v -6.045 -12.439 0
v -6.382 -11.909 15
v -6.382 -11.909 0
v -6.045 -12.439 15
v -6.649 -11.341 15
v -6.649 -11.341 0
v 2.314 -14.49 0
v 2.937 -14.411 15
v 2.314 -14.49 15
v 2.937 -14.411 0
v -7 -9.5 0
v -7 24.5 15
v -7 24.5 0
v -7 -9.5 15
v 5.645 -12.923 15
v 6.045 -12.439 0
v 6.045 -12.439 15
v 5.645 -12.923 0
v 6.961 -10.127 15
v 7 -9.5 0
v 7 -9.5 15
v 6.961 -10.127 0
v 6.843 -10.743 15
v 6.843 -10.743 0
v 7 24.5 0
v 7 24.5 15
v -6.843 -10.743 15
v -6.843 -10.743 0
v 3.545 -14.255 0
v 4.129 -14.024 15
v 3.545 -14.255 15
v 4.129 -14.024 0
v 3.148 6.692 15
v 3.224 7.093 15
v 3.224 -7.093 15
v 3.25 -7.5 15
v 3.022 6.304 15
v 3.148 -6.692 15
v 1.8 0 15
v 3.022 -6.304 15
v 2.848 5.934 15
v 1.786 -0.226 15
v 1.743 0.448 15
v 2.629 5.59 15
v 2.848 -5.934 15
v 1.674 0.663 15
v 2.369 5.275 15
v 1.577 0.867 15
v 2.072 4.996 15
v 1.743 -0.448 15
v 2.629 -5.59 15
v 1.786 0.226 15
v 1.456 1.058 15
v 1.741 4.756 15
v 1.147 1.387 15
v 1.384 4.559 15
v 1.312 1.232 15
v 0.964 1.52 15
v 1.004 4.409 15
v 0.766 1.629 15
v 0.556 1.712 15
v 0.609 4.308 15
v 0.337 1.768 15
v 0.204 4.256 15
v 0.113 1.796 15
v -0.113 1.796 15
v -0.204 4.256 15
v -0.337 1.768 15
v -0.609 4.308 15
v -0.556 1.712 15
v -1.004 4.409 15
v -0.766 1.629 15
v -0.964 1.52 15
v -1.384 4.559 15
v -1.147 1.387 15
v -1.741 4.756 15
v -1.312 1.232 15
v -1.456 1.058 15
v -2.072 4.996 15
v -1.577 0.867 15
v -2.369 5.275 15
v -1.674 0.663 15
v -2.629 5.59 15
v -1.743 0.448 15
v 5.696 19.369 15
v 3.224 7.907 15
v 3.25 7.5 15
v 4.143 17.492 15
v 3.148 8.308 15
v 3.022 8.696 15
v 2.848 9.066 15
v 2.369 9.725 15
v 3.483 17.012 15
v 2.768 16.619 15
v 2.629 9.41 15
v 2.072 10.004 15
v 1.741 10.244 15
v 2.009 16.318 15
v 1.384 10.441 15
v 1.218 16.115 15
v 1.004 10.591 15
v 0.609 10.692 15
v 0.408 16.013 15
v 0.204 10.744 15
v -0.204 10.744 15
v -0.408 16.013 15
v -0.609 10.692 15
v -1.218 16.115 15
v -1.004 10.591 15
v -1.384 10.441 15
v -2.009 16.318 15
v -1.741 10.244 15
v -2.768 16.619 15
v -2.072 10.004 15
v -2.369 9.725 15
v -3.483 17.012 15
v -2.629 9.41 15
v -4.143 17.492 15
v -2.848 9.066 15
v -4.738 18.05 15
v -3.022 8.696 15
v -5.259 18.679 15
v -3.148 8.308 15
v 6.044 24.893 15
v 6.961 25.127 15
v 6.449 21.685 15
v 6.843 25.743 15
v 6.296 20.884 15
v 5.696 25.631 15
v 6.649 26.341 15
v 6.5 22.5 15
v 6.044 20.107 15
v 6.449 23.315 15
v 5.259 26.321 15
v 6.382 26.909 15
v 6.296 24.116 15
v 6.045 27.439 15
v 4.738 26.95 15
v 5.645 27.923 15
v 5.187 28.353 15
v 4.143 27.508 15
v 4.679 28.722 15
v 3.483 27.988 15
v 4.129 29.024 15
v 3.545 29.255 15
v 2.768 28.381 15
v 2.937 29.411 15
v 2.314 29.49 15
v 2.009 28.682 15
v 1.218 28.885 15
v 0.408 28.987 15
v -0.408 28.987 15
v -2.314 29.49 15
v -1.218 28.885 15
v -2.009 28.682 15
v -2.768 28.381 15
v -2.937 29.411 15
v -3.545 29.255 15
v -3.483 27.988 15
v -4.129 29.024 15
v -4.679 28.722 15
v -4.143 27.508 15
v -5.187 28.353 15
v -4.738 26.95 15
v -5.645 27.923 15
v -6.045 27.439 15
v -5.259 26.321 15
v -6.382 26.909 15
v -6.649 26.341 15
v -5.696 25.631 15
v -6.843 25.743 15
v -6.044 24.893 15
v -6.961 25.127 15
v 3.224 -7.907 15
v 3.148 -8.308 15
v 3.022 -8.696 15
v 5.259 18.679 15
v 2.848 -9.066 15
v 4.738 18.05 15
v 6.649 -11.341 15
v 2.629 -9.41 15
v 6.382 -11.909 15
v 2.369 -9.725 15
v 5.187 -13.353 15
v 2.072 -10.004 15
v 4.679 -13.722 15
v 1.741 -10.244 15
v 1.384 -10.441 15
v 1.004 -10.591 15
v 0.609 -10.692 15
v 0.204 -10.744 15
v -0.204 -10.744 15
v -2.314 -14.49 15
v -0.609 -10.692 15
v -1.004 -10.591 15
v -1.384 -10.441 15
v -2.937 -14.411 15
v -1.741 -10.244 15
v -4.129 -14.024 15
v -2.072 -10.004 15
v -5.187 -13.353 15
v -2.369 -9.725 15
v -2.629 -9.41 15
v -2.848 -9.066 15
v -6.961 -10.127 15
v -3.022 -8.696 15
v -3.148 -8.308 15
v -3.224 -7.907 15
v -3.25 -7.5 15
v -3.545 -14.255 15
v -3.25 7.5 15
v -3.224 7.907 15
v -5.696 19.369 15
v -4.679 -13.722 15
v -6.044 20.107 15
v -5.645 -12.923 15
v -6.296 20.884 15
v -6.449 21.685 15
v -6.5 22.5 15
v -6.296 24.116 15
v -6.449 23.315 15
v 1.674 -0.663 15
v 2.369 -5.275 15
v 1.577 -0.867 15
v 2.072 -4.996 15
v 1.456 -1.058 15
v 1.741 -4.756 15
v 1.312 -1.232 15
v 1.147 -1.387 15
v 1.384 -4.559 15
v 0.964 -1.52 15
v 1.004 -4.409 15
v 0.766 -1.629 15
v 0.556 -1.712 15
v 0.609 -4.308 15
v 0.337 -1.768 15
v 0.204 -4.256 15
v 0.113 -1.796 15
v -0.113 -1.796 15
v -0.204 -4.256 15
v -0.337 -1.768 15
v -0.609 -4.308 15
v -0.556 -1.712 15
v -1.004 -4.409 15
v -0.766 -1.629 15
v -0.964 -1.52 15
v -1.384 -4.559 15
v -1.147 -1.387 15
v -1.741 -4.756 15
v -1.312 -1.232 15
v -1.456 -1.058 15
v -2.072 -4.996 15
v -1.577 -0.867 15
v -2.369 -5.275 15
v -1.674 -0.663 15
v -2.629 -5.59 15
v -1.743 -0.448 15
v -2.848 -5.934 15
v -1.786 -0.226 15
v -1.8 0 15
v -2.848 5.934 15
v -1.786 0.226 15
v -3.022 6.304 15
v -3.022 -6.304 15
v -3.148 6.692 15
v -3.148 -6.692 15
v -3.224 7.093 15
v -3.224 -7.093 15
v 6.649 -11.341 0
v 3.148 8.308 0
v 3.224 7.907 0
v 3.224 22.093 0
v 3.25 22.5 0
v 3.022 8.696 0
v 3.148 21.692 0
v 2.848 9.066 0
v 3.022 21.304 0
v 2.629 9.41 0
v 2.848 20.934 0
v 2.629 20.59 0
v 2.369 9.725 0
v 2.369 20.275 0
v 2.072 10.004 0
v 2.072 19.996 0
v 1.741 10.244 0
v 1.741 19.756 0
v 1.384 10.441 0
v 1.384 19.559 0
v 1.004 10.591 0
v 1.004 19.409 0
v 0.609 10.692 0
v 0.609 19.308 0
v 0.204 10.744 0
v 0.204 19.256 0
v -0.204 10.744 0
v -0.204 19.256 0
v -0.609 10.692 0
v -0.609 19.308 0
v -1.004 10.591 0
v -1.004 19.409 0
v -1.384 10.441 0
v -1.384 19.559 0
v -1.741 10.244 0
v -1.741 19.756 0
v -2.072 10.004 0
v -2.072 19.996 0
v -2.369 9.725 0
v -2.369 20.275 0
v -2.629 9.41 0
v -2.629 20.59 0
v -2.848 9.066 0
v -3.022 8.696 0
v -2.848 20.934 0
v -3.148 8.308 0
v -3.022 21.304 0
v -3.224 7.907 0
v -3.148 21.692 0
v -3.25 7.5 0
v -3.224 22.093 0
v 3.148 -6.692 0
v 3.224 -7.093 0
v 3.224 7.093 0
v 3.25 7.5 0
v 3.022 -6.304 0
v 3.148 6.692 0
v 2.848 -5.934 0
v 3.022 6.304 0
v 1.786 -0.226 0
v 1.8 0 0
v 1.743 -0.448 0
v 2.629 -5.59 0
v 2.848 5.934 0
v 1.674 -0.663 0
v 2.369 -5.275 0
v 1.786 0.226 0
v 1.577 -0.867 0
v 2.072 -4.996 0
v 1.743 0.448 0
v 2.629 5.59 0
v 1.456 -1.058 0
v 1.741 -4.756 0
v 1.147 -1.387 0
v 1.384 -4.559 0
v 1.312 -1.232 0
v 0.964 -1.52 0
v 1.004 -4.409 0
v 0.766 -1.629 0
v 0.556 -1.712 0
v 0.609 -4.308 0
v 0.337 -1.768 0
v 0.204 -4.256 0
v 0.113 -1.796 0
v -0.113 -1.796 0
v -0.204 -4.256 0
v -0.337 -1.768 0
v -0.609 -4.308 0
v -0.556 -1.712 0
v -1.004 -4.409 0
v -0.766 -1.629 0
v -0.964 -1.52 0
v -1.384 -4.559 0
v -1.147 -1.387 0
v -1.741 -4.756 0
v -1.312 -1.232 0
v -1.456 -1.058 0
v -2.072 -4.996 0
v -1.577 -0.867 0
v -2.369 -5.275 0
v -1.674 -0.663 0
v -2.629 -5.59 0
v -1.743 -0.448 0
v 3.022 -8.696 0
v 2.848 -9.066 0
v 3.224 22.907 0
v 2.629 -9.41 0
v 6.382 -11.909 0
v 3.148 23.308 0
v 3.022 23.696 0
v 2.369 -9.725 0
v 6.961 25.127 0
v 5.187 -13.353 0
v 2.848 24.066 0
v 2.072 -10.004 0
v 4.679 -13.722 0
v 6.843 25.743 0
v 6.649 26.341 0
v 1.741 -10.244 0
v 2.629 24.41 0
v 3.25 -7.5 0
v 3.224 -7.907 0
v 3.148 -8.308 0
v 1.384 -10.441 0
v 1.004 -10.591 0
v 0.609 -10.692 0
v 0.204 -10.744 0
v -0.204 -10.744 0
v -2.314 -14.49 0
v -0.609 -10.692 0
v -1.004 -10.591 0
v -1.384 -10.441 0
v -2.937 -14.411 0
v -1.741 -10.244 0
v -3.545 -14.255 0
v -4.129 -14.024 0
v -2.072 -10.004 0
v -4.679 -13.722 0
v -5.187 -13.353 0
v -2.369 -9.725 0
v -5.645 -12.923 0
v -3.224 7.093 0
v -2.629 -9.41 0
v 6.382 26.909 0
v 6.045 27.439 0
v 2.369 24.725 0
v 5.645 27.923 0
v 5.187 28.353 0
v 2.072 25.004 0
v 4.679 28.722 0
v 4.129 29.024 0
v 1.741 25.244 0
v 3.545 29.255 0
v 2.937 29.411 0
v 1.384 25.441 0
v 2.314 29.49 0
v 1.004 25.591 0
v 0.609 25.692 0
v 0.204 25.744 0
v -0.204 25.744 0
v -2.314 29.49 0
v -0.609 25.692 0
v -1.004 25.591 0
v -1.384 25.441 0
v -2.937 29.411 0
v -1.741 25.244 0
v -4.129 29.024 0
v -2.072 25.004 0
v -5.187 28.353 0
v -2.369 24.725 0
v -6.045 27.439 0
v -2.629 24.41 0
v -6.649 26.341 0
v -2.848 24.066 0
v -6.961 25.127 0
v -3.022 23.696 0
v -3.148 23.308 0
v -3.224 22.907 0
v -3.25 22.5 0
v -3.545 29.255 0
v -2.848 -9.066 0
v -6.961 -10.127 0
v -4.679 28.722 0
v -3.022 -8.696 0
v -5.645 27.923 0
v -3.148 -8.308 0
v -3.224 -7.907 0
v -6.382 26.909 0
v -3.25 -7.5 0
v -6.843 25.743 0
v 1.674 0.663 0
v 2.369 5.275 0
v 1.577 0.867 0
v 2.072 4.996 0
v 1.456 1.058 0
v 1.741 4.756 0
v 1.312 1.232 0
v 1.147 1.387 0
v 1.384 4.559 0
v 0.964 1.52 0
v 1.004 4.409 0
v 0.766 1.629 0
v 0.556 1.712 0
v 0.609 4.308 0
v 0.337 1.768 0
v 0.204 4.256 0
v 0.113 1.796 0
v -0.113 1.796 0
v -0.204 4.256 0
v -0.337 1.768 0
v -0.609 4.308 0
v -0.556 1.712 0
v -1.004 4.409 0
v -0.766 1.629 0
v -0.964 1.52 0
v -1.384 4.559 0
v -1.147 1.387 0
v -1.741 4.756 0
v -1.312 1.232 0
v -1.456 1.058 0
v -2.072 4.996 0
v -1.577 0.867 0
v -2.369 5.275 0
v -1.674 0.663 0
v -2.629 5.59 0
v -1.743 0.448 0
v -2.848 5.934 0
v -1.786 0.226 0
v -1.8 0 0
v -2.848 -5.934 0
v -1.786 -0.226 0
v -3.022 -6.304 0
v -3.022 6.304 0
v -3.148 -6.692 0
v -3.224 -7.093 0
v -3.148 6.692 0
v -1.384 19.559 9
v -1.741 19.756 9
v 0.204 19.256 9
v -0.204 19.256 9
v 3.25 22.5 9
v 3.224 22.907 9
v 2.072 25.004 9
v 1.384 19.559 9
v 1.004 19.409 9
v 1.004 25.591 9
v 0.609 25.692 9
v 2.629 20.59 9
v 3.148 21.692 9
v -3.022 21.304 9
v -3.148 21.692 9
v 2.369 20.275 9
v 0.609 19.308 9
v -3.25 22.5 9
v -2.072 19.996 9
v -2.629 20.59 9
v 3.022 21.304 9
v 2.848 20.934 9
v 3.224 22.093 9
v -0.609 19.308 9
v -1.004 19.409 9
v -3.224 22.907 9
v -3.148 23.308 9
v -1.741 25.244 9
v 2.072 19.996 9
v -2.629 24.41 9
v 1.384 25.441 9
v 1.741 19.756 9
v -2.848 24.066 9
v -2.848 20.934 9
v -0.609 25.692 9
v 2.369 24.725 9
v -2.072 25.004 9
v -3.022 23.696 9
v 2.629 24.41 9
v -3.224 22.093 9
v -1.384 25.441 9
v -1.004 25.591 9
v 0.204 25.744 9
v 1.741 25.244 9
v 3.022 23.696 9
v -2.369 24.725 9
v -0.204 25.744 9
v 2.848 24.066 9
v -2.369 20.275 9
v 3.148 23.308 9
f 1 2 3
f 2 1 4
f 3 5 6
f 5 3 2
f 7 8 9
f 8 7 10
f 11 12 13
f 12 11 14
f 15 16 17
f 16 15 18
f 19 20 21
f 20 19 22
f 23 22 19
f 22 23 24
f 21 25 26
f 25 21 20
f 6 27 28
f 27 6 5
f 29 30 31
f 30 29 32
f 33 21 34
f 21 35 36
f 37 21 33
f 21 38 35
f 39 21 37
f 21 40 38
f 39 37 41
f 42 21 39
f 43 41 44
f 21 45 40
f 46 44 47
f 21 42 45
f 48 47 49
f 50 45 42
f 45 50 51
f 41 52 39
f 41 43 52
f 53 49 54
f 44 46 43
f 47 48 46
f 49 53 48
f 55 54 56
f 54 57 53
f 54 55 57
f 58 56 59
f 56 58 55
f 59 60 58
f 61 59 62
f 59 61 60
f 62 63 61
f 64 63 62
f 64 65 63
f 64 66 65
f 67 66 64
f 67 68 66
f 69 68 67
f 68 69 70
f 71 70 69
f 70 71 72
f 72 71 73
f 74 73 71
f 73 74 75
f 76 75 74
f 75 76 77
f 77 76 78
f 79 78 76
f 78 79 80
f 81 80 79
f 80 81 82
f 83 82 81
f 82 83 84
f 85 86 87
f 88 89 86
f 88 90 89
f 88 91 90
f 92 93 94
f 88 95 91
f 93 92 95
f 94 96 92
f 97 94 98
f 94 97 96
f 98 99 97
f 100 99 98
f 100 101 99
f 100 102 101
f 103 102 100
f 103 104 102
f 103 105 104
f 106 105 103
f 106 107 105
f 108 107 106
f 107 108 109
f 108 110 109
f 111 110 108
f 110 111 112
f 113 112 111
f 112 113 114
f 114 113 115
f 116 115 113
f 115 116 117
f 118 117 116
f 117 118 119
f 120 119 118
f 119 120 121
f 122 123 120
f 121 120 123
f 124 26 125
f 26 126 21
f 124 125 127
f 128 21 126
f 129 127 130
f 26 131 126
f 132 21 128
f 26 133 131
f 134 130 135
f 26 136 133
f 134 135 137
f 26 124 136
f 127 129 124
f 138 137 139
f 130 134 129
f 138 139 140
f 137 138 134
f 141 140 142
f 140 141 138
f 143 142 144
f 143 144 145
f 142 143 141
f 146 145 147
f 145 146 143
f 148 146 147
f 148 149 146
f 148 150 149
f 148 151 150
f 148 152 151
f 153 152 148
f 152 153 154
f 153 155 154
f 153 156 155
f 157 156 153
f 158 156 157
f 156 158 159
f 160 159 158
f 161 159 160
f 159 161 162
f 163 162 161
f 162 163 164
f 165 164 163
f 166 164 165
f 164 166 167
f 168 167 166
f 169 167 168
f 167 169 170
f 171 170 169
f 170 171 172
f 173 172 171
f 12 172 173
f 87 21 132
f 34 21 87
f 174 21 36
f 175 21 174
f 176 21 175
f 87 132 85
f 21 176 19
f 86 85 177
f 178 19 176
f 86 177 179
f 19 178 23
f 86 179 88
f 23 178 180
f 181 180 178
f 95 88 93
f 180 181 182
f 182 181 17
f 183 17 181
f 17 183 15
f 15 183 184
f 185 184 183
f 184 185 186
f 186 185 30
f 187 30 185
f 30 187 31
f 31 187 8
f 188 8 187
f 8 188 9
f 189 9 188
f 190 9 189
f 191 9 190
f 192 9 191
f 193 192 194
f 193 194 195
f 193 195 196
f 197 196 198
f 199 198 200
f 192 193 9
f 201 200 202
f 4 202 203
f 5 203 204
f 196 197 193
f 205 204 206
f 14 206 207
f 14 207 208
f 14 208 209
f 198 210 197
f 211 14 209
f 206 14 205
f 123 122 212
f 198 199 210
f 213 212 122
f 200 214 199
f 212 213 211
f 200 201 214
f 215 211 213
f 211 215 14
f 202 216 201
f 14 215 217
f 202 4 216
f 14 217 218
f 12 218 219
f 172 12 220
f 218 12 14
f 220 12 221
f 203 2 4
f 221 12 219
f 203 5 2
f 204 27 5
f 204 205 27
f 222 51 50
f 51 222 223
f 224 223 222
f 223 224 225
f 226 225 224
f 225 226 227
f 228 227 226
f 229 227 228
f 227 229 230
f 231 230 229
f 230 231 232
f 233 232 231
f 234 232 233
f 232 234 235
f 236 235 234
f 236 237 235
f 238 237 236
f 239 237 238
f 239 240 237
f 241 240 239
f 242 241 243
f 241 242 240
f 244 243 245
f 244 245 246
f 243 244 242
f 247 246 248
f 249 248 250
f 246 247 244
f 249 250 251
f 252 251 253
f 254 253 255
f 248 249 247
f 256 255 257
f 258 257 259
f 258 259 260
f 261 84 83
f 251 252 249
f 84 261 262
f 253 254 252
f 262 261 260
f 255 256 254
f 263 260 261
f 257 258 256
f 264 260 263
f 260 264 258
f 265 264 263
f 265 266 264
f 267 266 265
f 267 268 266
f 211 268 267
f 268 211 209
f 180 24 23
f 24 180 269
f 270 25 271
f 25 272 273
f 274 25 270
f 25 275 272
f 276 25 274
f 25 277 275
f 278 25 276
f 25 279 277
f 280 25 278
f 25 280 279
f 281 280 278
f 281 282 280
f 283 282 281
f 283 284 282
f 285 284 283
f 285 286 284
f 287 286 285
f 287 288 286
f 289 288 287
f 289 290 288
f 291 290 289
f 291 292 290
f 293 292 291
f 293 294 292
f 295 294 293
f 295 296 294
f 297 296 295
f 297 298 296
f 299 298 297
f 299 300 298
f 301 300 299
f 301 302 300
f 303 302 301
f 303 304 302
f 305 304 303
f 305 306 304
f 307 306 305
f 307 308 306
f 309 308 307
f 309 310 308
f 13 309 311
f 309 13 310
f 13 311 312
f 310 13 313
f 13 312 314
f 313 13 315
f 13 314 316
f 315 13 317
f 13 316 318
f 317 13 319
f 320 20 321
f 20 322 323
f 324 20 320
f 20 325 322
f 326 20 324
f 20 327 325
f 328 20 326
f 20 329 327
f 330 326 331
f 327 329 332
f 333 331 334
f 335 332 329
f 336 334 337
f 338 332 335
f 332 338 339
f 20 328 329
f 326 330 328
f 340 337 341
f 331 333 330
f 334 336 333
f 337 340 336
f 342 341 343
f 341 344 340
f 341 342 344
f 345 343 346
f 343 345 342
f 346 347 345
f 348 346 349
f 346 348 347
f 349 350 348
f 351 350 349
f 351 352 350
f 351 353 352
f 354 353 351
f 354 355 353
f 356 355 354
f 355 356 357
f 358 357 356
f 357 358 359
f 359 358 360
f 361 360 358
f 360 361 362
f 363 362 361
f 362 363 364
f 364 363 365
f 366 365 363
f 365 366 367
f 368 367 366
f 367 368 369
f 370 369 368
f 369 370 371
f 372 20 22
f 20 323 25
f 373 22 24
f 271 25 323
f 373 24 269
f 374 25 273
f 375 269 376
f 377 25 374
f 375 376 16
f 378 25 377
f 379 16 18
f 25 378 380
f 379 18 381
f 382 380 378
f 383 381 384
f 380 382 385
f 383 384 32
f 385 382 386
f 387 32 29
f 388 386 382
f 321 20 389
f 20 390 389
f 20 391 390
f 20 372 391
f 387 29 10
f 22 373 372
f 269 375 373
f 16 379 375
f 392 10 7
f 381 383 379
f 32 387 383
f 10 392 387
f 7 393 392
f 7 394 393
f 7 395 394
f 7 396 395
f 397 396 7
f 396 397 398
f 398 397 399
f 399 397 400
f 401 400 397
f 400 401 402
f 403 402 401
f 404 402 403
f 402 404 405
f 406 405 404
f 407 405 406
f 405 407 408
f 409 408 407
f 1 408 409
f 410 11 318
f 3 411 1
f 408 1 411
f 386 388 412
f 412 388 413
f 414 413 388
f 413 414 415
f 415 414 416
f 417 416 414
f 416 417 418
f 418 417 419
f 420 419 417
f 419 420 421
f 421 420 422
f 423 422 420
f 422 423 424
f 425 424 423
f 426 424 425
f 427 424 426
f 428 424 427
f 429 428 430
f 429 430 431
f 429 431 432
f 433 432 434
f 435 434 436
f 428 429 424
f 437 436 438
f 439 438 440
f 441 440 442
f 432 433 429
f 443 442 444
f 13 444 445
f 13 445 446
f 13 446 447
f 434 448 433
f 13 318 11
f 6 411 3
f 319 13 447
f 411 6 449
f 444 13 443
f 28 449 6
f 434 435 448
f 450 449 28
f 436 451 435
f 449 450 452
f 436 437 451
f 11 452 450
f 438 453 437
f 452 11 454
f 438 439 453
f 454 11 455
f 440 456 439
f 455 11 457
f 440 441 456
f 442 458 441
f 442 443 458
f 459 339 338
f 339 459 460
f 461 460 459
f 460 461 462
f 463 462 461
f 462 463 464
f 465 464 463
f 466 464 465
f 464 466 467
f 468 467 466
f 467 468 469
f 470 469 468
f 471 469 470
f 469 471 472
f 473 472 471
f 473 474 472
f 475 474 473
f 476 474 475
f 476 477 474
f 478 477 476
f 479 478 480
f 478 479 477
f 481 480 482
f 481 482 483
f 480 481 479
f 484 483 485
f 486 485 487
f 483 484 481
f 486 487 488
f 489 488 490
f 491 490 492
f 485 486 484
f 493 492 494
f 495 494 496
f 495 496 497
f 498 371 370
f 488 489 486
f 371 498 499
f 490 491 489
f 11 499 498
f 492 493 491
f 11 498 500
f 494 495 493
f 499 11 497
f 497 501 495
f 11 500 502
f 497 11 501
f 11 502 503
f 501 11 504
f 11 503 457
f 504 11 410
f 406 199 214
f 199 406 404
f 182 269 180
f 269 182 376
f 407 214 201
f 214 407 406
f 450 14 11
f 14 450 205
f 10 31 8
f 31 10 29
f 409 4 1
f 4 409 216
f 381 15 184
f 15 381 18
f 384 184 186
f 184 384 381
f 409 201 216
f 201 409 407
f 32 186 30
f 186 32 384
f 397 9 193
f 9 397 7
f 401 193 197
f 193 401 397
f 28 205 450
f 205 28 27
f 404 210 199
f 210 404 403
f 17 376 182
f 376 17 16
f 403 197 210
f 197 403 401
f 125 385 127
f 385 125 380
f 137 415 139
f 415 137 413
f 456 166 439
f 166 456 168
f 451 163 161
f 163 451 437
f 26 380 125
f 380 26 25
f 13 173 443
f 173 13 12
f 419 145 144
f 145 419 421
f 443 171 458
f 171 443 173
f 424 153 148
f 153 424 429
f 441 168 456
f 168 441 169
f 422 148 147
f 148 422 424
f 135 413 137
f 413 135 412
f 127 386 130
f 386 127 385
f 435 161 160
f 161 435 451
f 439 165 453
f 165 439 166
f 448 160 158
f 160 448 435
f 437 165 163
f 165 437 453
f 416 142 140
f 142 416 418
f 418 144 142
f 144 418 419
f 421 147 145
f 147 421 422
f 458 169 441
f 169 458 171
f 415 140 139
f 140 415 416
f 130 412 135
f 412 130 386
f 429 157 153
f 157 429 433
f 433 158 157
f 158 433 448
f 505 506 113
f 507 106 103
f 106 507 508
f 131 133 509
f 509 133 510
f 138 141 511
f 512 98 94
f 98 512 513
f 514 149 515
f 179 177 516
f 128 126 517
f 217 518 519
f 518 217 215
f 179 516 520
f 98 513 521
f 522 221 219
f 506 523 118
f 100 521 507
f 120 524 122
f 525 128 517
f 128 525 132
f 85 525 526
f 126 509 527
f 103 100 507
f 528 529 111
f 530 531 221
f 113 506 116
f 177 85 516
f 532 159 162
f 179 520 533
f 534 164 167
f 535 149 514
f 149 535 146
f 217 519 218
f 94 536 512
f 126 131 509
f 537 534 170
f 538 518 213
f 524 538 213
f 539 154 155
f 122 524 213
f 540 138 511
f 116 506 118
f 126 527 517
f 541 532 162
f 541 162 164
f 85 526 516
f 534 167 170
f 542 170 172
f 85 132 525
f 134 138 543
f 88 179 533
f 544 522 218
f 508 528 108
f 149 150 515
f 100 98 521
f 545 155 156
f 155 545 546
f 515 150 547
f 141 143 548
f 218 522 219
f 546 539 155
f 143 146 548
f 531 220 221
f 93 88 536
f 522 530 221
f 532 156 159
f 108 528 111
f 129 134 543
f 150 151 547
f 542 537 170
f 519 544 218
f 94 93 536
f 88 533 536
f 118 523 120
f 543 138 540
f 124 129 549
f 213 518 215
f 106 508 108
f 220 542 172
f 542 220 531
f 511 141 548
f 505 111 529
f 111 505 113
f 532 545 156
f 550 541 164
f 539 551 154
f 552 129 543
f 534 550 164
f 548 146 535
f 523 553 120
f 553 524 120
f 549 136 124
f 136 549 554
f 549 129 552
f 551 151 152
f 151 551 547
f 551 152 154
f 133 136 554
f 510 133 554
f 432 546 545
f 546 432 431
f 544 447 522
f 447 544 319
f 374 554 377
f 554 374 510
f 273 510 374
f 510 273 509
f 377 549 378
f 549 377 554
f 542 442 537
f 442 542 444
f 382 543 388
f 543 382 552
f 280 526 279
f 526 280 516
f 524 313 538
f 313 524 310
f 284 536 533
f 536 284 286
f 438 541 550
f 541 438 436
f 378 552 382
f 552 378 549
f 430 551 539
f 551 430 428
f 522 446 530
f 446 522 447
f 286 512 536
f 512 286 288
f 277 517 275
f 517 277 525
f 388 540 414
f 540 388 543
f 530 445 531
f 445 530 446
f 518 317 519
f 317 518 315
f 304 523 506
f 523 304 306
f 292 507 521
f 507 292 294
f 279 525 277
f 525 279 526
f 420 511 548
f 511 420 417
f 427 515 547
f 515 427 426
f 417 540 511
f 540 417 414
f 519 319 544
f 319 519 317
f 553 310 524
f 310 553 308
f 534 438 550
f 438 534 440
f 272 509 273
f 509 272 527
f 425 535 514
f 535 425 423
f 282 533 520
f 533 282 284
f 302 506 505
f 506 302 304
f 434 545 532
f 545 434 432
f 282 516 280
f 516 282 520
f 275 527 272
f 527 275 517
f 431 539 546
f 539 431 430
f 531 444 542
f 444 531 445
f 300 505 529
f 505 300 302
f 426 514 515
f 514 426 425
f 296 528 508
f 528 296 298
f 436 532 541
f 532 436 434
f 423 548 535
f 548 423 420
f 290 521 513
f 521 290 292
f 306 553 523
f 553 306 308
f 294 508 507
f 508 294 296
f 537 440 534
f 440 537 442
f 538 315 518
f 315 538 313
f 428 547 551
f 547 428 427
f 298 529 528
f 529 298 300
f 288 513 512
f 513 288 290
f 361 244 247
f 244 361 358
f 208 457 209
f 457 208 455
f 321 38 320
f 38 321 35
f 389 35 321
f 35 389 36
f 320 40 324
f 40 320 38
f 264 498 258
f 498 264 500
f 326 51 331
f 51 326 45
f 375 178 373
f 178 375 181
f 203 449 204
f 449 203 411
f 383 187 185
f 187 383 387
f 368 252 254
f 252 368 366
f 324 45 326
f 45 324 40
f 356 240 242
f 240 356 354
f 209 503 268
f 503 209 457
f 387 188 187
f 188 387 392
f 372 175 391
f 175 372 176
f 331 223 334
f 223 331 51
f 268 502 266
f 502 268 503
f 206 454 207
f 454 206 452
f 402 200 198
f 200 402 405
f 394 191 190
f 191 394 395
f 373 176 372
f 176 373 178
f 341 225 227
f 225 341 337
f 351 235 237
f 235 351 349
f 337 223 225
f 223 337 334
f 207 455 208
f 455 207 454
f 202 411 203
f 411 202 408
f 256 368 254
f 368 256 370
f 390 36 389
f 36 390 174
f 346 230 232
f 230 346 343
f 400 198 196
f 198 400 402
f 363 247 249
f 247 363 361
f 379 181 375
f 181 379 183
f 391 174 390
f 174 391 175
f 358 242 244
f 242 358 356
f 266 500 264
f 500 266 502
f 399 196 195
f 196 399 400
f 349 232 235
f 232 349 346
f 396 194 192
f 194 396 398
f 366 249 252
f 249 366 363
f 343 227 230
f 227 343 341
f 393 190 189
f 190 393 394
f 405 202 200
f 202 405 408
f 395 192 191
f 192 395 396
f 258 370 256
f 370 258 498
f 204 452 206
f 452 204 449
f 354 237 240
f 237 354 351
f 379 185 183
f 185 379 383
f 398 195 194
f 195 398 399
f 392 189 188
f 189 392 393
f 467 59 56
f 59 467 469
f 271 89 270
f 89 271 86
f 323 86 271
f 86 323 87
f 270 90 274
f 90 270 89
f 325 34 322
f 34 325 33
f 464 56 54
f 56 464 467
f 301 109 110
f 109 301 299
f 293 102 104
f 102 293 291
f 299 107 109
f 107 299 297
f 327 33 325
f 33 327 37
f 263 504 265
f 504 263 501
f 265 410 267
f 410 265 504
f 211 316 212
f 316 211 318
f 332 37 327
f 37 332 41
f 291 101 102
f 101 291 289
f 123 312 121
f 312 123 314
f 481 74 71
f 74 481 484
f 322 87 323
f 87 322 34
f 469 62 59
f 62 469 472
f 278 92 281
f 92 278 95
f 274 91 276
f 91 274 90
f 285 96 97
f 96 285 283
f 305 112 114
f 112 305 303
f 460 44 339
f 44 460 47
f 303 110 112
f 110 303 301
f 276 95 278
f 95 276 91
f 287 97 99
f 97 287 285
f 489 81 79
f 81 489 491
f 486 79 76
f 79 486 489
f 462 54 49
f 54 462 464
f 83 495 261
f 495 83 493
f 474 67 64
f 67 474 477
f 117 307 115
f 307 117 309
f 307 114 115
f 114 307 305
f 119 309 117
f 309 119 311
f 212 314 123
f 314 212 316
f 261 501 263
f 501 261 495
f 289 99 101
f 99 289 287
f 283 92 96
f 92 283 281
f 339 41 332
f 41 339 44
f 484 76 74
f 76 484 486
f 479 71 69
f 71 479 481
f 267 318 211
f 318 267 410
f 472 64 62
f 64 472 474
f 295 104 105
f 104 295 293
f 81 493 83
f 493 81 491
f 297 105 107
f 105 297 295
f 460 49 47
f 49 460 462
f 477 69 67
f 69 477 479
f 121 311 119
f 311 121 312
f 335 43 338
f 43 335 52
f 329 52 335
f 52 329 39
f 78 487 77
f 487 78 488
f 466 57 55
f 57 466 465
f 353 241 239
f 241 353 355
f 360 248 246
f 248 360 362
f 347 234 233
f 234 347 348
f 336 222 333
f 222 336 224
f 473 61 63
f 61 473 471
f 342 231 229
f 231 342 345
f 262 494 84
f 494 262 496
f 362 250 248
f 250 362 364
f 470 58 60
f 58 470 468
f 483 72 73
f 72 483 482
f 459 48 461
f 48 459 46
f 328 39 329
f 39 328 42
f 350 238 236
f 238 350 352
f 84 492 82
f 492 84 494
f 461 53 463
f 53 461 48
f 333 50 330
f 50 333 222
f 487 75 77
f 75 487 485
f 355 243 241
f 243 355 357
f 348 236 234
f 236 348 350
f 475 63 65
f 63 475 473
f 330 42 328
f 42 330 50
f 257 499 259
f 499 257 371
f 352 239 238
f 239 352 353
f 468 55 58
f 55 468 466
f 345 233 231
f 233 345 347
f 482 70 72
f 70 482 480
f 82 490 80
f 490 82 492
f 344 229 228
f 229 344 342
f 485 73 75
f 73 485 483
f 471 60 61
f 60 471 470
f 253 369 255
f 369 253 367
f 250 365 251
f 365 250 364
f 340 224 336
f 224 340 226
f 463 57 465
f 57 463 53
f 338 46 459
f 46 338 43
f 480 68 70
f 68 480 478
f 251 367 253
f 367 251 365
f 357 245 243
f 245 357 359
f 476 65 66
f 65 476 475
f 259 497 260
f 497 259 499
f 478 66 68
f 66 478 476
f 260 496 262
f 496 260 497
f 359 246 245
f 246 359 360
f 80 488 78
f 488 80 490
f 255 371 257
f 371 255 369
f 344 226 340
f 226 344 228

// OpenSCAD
$fn = 50;


difference() {
	union() {
		hull() {
			translate(v = [-2.0000000000, 9.5000000000, 0]) {
				cylinder(h = 15, r = 5);
			}
			translate(v = [2.0000000000, 9.5000000000, 0]) {
				cylinder(h = 15, r = 5);
			}
			translate(v = [-2.0000000000, -9.5000000000, 0]) {
				cylinder(h = 15, r = 5);
			}
			translate(v = [2.0000000000, -9.5000000000, 0]) {
				cylinder(h = 15, r = 5);
			}
		}
		translate(v = [0.0000000000, 15.0000000000, 0]) {
			hull() {
				translate(v = [-2.0000000000, 9.5000000000, 0]) {
					cylinder(h = 15, r = 5);
				}
				translate(v = [2.0000000000, 9.5000000000, 0]) {
					cylinder(h = 15, r = 5);
				}
				translate(v = [-2.0000000000, -9.5000000000, 0]) {
					cylinder(h = 15, r = 5);
				}
				translate(v = [2.0000000000, -9.5000000000, 0]) {
					cylinder(h = 15, r = 5);
				}
			}
		}
		translate(v = [0.0000000000, 15.0000000000, 0]) {
			hull() {
				translate(v = [-2.0000000000, 9.5000000000, 0]) {
					cylinder(h = 15, r = 5);
				}
				translate(v = [2.0000000000, 9.5000000000, 0]) {
					cylinder(h = 15, r = 5);
				}
				translate(v = [-2.0000000000, -9.5000000000, 0]) {
					cylinder(h = 15, r = 5);
				}
				translate(v = [2.0000000000, -9.5000000000, 0]) {
					cylinder(h = 15, r = 5);
				}
			}
		}
	}
	union() {
		translate(v = [0.0000000000, 22.5000000000, 15]) {
			rotate(a = [0, 0, 0]) {
				difference() {
					union() {
						#translate(v = [0, 0, -15.0000000000]) {
							cylinder(h = 15, r = 2.2500000000);
						}
						#translate(v = [0, 0, -6]) {
							cylinder(h = 6, r1 = 3.2500000000, r2 = 6.5000000000);
						}
						#translate(v = [0, 0, -15.0000000000]) {
							cylinder(h = 15, r = 3.2500000000);
						}
						#translate(v = [0, 0, -15.0000000000]) {
							cylinder(h = 15, r = 2.2500000000);
						}
					}
					union();
				}
			}
		}
		translate(v = [0.0000000000, 22.5000000000, 15]) {
			rotate(a = [0, 0, 0]) {
				difference() {
					union() {
						#translate(v = [0, 0, -15.0000000000]) {
							cylinder(h = 15, r = 2.2500000000);
						}
						#translate(v = [0, 0, -6]) {
							cylinder(h = 6, r1 = 3.2500000000, r2 = 6.5000000000);
						}
						#translate(v = [0, 0, -15.0000000000]) {
							cylinder(h = 15, r = 3.2500000000);
						}
						#translate(v = [0, 0, -15.0000000000]) {
							cylinder(h = 15, r = 2.2500000000);
						}
					}
					union();
				}
			}
		}
		translate(v = [0.0000000000, -7.5000000000, 0]) {
			translate(v = [0, 0, -100]) {
				cylinder(h = 200, r = 3.2500000000);
			}
		}
		translate(v = [0.0000000000, 7.5000000000, 0]) {
			translate(v = [0, 0, -100]) {
				cylinder(h = 200, r = 3.2500000000);
			}
		}
		translate(v = [0.0000000000, -7.5000000000, 0]) {
			translate(v = [0, 0, -100]) {
				cylinder(h = 200, r = 1.8000000000);
			}
		}
		translate(v = [0, 0, -100]) {
			cylinder(h = 200, r = 1.8000000000);
		}
		translate(v = [0.0000000000, 7.5000000000, 0]) {
			translate(v = [0, 0, -100]) {
				cylinder(h = 200, r = 1.8000000000);
			}
		}
	}
}
